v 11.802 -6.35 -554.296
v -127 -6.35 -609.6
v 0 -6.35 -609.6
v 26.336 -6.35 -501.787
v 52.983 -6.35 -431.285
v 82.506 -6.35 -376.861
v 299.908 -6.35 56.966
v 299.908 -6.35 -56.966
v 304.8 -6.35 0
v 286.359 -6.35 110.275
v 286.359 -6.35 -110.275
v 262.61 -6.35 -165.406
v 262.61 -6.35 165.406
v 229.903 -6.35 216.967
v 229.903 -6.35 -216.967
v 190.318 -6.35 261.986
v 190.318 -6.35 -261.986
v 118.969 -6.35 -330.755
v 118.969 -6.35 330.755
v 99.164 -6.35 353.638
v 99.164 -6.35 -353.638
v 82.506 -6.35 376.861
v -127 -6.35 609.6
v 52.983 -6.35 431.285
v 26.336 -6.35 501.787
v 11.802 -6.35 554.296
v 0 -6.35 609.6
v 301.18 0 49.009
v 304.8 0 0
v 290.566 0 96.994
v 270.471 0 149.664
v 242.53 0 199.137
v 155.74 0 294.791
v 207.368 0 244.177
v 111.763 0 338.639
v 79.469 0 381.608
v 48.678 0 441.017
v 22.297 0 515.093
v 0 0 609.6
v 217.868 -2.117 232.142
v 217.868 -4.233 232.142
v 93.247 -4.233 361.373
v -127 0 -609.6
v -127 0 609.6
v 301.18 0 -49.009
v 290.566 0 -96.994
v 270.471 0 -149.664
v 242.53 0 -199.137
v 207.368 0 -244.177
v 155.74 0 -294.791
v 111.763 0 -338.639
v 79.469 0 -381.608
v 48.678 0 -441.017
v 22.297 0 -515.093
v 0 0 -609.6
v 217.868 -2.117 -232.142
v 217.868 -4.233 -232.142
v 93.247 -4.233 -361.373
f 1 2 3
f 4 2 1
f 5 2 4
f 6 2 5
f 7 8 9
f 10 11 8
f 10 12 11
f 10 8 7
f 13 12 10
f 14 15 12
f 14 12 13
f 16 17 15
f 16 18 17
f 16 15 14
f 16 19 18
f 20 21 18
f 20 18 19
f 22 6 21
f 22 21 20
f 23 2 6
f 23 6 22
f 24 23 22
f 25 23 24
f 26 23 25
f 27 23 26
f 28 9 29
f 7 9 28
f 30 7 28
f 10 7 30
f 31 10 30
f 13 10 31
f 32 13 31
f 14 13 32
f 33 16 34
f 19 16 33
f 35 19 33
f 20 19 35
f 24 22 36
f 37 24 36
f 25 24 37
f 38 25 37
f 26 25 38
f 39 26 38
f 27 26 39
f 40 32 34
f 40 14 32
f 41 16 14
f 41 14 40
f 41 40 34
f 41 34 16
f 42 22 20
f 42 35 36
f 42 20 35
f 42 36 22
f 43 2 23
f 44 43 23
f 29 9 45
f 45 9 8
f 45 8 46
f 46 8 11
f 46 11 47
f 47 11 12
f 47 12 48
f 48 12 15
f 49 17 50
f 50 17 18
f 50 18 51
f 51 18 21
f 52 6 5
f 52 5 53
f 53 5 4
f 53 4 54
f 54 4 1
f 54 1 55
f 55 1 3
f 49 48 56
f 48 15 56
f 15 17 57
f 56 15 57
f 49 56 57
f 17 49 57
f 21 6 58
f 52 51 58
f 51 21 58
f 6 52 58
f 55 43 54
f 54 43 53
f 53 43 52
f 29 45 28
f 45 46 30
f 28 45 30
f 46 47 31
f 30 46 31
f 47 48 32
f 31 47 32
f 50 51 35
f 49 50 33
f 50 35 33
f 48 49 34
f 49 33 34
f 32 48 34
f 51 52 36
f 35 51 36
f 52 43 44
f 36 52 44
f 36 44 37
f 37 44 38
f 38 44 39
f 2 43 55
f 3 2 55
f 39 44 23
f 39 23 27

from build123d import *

# Parameters (mm, degrees)
F0_W     = 609.6
F0_H     = 1219.2
F1_DEPTH = 6.35
F2_W     = 177.8
F2_H     = 1219.2
F3_DEPTH = 6.351


with BuildPart() as f1:
    # F0 (on Front) → F1 (new body)
    with BuildSketch(Plane.XZ):
        Rectangle(F0_W, F0_H)
    extrude(amount=F1_DEPTH)

    # F2 (on face) → F3 (cut, through all)
    with BuildSketch(Plane.XZ.offset(6.35)):
        with BuildLine():
            add(Edge.make_bspline(
                [(304.8, 0), (304.8, 92.9325740233), (232.3835883977, 244.8032665536), (73.1047943945, 348.6310422575), (18.2378050836, 511.3671324522), (0, 609.6)],
                knots=[0, 0, 0, 0, 0.3465854329, 0.6415391071, 1, 1, 1, 1], degree=3))
            Line((304.8, 0), (304.8, 609.6))
            Line((304.8, 609.6), (0, 609.6))
        make_face()
        with BuildLine():
            Line((304.8, -609.6), (304.8, 0))
            add(Edge.make_bspline(
                [(304.8, 0), (304.8, -92.9325740233), (232.3835883977, -244.8032665536), (73.1047943945, -348.6310422575), (18.2378050836, -511.3671324522), (0, -609.6)],
                knots=[0, 0, 0, 0, 0.3465854329, 0.6415391071, 1, 1, 1, 1], degree=3))
            Line((0, -609.6), (304.8, -609.6))
        make_face()
        with Locations((-215.9, 0)):
            Rectangle(F2_W, F2_H)
    extrude(amount=-F3_DEPTH, mode=Mode.SUBTRACT)


solid = f1.part
